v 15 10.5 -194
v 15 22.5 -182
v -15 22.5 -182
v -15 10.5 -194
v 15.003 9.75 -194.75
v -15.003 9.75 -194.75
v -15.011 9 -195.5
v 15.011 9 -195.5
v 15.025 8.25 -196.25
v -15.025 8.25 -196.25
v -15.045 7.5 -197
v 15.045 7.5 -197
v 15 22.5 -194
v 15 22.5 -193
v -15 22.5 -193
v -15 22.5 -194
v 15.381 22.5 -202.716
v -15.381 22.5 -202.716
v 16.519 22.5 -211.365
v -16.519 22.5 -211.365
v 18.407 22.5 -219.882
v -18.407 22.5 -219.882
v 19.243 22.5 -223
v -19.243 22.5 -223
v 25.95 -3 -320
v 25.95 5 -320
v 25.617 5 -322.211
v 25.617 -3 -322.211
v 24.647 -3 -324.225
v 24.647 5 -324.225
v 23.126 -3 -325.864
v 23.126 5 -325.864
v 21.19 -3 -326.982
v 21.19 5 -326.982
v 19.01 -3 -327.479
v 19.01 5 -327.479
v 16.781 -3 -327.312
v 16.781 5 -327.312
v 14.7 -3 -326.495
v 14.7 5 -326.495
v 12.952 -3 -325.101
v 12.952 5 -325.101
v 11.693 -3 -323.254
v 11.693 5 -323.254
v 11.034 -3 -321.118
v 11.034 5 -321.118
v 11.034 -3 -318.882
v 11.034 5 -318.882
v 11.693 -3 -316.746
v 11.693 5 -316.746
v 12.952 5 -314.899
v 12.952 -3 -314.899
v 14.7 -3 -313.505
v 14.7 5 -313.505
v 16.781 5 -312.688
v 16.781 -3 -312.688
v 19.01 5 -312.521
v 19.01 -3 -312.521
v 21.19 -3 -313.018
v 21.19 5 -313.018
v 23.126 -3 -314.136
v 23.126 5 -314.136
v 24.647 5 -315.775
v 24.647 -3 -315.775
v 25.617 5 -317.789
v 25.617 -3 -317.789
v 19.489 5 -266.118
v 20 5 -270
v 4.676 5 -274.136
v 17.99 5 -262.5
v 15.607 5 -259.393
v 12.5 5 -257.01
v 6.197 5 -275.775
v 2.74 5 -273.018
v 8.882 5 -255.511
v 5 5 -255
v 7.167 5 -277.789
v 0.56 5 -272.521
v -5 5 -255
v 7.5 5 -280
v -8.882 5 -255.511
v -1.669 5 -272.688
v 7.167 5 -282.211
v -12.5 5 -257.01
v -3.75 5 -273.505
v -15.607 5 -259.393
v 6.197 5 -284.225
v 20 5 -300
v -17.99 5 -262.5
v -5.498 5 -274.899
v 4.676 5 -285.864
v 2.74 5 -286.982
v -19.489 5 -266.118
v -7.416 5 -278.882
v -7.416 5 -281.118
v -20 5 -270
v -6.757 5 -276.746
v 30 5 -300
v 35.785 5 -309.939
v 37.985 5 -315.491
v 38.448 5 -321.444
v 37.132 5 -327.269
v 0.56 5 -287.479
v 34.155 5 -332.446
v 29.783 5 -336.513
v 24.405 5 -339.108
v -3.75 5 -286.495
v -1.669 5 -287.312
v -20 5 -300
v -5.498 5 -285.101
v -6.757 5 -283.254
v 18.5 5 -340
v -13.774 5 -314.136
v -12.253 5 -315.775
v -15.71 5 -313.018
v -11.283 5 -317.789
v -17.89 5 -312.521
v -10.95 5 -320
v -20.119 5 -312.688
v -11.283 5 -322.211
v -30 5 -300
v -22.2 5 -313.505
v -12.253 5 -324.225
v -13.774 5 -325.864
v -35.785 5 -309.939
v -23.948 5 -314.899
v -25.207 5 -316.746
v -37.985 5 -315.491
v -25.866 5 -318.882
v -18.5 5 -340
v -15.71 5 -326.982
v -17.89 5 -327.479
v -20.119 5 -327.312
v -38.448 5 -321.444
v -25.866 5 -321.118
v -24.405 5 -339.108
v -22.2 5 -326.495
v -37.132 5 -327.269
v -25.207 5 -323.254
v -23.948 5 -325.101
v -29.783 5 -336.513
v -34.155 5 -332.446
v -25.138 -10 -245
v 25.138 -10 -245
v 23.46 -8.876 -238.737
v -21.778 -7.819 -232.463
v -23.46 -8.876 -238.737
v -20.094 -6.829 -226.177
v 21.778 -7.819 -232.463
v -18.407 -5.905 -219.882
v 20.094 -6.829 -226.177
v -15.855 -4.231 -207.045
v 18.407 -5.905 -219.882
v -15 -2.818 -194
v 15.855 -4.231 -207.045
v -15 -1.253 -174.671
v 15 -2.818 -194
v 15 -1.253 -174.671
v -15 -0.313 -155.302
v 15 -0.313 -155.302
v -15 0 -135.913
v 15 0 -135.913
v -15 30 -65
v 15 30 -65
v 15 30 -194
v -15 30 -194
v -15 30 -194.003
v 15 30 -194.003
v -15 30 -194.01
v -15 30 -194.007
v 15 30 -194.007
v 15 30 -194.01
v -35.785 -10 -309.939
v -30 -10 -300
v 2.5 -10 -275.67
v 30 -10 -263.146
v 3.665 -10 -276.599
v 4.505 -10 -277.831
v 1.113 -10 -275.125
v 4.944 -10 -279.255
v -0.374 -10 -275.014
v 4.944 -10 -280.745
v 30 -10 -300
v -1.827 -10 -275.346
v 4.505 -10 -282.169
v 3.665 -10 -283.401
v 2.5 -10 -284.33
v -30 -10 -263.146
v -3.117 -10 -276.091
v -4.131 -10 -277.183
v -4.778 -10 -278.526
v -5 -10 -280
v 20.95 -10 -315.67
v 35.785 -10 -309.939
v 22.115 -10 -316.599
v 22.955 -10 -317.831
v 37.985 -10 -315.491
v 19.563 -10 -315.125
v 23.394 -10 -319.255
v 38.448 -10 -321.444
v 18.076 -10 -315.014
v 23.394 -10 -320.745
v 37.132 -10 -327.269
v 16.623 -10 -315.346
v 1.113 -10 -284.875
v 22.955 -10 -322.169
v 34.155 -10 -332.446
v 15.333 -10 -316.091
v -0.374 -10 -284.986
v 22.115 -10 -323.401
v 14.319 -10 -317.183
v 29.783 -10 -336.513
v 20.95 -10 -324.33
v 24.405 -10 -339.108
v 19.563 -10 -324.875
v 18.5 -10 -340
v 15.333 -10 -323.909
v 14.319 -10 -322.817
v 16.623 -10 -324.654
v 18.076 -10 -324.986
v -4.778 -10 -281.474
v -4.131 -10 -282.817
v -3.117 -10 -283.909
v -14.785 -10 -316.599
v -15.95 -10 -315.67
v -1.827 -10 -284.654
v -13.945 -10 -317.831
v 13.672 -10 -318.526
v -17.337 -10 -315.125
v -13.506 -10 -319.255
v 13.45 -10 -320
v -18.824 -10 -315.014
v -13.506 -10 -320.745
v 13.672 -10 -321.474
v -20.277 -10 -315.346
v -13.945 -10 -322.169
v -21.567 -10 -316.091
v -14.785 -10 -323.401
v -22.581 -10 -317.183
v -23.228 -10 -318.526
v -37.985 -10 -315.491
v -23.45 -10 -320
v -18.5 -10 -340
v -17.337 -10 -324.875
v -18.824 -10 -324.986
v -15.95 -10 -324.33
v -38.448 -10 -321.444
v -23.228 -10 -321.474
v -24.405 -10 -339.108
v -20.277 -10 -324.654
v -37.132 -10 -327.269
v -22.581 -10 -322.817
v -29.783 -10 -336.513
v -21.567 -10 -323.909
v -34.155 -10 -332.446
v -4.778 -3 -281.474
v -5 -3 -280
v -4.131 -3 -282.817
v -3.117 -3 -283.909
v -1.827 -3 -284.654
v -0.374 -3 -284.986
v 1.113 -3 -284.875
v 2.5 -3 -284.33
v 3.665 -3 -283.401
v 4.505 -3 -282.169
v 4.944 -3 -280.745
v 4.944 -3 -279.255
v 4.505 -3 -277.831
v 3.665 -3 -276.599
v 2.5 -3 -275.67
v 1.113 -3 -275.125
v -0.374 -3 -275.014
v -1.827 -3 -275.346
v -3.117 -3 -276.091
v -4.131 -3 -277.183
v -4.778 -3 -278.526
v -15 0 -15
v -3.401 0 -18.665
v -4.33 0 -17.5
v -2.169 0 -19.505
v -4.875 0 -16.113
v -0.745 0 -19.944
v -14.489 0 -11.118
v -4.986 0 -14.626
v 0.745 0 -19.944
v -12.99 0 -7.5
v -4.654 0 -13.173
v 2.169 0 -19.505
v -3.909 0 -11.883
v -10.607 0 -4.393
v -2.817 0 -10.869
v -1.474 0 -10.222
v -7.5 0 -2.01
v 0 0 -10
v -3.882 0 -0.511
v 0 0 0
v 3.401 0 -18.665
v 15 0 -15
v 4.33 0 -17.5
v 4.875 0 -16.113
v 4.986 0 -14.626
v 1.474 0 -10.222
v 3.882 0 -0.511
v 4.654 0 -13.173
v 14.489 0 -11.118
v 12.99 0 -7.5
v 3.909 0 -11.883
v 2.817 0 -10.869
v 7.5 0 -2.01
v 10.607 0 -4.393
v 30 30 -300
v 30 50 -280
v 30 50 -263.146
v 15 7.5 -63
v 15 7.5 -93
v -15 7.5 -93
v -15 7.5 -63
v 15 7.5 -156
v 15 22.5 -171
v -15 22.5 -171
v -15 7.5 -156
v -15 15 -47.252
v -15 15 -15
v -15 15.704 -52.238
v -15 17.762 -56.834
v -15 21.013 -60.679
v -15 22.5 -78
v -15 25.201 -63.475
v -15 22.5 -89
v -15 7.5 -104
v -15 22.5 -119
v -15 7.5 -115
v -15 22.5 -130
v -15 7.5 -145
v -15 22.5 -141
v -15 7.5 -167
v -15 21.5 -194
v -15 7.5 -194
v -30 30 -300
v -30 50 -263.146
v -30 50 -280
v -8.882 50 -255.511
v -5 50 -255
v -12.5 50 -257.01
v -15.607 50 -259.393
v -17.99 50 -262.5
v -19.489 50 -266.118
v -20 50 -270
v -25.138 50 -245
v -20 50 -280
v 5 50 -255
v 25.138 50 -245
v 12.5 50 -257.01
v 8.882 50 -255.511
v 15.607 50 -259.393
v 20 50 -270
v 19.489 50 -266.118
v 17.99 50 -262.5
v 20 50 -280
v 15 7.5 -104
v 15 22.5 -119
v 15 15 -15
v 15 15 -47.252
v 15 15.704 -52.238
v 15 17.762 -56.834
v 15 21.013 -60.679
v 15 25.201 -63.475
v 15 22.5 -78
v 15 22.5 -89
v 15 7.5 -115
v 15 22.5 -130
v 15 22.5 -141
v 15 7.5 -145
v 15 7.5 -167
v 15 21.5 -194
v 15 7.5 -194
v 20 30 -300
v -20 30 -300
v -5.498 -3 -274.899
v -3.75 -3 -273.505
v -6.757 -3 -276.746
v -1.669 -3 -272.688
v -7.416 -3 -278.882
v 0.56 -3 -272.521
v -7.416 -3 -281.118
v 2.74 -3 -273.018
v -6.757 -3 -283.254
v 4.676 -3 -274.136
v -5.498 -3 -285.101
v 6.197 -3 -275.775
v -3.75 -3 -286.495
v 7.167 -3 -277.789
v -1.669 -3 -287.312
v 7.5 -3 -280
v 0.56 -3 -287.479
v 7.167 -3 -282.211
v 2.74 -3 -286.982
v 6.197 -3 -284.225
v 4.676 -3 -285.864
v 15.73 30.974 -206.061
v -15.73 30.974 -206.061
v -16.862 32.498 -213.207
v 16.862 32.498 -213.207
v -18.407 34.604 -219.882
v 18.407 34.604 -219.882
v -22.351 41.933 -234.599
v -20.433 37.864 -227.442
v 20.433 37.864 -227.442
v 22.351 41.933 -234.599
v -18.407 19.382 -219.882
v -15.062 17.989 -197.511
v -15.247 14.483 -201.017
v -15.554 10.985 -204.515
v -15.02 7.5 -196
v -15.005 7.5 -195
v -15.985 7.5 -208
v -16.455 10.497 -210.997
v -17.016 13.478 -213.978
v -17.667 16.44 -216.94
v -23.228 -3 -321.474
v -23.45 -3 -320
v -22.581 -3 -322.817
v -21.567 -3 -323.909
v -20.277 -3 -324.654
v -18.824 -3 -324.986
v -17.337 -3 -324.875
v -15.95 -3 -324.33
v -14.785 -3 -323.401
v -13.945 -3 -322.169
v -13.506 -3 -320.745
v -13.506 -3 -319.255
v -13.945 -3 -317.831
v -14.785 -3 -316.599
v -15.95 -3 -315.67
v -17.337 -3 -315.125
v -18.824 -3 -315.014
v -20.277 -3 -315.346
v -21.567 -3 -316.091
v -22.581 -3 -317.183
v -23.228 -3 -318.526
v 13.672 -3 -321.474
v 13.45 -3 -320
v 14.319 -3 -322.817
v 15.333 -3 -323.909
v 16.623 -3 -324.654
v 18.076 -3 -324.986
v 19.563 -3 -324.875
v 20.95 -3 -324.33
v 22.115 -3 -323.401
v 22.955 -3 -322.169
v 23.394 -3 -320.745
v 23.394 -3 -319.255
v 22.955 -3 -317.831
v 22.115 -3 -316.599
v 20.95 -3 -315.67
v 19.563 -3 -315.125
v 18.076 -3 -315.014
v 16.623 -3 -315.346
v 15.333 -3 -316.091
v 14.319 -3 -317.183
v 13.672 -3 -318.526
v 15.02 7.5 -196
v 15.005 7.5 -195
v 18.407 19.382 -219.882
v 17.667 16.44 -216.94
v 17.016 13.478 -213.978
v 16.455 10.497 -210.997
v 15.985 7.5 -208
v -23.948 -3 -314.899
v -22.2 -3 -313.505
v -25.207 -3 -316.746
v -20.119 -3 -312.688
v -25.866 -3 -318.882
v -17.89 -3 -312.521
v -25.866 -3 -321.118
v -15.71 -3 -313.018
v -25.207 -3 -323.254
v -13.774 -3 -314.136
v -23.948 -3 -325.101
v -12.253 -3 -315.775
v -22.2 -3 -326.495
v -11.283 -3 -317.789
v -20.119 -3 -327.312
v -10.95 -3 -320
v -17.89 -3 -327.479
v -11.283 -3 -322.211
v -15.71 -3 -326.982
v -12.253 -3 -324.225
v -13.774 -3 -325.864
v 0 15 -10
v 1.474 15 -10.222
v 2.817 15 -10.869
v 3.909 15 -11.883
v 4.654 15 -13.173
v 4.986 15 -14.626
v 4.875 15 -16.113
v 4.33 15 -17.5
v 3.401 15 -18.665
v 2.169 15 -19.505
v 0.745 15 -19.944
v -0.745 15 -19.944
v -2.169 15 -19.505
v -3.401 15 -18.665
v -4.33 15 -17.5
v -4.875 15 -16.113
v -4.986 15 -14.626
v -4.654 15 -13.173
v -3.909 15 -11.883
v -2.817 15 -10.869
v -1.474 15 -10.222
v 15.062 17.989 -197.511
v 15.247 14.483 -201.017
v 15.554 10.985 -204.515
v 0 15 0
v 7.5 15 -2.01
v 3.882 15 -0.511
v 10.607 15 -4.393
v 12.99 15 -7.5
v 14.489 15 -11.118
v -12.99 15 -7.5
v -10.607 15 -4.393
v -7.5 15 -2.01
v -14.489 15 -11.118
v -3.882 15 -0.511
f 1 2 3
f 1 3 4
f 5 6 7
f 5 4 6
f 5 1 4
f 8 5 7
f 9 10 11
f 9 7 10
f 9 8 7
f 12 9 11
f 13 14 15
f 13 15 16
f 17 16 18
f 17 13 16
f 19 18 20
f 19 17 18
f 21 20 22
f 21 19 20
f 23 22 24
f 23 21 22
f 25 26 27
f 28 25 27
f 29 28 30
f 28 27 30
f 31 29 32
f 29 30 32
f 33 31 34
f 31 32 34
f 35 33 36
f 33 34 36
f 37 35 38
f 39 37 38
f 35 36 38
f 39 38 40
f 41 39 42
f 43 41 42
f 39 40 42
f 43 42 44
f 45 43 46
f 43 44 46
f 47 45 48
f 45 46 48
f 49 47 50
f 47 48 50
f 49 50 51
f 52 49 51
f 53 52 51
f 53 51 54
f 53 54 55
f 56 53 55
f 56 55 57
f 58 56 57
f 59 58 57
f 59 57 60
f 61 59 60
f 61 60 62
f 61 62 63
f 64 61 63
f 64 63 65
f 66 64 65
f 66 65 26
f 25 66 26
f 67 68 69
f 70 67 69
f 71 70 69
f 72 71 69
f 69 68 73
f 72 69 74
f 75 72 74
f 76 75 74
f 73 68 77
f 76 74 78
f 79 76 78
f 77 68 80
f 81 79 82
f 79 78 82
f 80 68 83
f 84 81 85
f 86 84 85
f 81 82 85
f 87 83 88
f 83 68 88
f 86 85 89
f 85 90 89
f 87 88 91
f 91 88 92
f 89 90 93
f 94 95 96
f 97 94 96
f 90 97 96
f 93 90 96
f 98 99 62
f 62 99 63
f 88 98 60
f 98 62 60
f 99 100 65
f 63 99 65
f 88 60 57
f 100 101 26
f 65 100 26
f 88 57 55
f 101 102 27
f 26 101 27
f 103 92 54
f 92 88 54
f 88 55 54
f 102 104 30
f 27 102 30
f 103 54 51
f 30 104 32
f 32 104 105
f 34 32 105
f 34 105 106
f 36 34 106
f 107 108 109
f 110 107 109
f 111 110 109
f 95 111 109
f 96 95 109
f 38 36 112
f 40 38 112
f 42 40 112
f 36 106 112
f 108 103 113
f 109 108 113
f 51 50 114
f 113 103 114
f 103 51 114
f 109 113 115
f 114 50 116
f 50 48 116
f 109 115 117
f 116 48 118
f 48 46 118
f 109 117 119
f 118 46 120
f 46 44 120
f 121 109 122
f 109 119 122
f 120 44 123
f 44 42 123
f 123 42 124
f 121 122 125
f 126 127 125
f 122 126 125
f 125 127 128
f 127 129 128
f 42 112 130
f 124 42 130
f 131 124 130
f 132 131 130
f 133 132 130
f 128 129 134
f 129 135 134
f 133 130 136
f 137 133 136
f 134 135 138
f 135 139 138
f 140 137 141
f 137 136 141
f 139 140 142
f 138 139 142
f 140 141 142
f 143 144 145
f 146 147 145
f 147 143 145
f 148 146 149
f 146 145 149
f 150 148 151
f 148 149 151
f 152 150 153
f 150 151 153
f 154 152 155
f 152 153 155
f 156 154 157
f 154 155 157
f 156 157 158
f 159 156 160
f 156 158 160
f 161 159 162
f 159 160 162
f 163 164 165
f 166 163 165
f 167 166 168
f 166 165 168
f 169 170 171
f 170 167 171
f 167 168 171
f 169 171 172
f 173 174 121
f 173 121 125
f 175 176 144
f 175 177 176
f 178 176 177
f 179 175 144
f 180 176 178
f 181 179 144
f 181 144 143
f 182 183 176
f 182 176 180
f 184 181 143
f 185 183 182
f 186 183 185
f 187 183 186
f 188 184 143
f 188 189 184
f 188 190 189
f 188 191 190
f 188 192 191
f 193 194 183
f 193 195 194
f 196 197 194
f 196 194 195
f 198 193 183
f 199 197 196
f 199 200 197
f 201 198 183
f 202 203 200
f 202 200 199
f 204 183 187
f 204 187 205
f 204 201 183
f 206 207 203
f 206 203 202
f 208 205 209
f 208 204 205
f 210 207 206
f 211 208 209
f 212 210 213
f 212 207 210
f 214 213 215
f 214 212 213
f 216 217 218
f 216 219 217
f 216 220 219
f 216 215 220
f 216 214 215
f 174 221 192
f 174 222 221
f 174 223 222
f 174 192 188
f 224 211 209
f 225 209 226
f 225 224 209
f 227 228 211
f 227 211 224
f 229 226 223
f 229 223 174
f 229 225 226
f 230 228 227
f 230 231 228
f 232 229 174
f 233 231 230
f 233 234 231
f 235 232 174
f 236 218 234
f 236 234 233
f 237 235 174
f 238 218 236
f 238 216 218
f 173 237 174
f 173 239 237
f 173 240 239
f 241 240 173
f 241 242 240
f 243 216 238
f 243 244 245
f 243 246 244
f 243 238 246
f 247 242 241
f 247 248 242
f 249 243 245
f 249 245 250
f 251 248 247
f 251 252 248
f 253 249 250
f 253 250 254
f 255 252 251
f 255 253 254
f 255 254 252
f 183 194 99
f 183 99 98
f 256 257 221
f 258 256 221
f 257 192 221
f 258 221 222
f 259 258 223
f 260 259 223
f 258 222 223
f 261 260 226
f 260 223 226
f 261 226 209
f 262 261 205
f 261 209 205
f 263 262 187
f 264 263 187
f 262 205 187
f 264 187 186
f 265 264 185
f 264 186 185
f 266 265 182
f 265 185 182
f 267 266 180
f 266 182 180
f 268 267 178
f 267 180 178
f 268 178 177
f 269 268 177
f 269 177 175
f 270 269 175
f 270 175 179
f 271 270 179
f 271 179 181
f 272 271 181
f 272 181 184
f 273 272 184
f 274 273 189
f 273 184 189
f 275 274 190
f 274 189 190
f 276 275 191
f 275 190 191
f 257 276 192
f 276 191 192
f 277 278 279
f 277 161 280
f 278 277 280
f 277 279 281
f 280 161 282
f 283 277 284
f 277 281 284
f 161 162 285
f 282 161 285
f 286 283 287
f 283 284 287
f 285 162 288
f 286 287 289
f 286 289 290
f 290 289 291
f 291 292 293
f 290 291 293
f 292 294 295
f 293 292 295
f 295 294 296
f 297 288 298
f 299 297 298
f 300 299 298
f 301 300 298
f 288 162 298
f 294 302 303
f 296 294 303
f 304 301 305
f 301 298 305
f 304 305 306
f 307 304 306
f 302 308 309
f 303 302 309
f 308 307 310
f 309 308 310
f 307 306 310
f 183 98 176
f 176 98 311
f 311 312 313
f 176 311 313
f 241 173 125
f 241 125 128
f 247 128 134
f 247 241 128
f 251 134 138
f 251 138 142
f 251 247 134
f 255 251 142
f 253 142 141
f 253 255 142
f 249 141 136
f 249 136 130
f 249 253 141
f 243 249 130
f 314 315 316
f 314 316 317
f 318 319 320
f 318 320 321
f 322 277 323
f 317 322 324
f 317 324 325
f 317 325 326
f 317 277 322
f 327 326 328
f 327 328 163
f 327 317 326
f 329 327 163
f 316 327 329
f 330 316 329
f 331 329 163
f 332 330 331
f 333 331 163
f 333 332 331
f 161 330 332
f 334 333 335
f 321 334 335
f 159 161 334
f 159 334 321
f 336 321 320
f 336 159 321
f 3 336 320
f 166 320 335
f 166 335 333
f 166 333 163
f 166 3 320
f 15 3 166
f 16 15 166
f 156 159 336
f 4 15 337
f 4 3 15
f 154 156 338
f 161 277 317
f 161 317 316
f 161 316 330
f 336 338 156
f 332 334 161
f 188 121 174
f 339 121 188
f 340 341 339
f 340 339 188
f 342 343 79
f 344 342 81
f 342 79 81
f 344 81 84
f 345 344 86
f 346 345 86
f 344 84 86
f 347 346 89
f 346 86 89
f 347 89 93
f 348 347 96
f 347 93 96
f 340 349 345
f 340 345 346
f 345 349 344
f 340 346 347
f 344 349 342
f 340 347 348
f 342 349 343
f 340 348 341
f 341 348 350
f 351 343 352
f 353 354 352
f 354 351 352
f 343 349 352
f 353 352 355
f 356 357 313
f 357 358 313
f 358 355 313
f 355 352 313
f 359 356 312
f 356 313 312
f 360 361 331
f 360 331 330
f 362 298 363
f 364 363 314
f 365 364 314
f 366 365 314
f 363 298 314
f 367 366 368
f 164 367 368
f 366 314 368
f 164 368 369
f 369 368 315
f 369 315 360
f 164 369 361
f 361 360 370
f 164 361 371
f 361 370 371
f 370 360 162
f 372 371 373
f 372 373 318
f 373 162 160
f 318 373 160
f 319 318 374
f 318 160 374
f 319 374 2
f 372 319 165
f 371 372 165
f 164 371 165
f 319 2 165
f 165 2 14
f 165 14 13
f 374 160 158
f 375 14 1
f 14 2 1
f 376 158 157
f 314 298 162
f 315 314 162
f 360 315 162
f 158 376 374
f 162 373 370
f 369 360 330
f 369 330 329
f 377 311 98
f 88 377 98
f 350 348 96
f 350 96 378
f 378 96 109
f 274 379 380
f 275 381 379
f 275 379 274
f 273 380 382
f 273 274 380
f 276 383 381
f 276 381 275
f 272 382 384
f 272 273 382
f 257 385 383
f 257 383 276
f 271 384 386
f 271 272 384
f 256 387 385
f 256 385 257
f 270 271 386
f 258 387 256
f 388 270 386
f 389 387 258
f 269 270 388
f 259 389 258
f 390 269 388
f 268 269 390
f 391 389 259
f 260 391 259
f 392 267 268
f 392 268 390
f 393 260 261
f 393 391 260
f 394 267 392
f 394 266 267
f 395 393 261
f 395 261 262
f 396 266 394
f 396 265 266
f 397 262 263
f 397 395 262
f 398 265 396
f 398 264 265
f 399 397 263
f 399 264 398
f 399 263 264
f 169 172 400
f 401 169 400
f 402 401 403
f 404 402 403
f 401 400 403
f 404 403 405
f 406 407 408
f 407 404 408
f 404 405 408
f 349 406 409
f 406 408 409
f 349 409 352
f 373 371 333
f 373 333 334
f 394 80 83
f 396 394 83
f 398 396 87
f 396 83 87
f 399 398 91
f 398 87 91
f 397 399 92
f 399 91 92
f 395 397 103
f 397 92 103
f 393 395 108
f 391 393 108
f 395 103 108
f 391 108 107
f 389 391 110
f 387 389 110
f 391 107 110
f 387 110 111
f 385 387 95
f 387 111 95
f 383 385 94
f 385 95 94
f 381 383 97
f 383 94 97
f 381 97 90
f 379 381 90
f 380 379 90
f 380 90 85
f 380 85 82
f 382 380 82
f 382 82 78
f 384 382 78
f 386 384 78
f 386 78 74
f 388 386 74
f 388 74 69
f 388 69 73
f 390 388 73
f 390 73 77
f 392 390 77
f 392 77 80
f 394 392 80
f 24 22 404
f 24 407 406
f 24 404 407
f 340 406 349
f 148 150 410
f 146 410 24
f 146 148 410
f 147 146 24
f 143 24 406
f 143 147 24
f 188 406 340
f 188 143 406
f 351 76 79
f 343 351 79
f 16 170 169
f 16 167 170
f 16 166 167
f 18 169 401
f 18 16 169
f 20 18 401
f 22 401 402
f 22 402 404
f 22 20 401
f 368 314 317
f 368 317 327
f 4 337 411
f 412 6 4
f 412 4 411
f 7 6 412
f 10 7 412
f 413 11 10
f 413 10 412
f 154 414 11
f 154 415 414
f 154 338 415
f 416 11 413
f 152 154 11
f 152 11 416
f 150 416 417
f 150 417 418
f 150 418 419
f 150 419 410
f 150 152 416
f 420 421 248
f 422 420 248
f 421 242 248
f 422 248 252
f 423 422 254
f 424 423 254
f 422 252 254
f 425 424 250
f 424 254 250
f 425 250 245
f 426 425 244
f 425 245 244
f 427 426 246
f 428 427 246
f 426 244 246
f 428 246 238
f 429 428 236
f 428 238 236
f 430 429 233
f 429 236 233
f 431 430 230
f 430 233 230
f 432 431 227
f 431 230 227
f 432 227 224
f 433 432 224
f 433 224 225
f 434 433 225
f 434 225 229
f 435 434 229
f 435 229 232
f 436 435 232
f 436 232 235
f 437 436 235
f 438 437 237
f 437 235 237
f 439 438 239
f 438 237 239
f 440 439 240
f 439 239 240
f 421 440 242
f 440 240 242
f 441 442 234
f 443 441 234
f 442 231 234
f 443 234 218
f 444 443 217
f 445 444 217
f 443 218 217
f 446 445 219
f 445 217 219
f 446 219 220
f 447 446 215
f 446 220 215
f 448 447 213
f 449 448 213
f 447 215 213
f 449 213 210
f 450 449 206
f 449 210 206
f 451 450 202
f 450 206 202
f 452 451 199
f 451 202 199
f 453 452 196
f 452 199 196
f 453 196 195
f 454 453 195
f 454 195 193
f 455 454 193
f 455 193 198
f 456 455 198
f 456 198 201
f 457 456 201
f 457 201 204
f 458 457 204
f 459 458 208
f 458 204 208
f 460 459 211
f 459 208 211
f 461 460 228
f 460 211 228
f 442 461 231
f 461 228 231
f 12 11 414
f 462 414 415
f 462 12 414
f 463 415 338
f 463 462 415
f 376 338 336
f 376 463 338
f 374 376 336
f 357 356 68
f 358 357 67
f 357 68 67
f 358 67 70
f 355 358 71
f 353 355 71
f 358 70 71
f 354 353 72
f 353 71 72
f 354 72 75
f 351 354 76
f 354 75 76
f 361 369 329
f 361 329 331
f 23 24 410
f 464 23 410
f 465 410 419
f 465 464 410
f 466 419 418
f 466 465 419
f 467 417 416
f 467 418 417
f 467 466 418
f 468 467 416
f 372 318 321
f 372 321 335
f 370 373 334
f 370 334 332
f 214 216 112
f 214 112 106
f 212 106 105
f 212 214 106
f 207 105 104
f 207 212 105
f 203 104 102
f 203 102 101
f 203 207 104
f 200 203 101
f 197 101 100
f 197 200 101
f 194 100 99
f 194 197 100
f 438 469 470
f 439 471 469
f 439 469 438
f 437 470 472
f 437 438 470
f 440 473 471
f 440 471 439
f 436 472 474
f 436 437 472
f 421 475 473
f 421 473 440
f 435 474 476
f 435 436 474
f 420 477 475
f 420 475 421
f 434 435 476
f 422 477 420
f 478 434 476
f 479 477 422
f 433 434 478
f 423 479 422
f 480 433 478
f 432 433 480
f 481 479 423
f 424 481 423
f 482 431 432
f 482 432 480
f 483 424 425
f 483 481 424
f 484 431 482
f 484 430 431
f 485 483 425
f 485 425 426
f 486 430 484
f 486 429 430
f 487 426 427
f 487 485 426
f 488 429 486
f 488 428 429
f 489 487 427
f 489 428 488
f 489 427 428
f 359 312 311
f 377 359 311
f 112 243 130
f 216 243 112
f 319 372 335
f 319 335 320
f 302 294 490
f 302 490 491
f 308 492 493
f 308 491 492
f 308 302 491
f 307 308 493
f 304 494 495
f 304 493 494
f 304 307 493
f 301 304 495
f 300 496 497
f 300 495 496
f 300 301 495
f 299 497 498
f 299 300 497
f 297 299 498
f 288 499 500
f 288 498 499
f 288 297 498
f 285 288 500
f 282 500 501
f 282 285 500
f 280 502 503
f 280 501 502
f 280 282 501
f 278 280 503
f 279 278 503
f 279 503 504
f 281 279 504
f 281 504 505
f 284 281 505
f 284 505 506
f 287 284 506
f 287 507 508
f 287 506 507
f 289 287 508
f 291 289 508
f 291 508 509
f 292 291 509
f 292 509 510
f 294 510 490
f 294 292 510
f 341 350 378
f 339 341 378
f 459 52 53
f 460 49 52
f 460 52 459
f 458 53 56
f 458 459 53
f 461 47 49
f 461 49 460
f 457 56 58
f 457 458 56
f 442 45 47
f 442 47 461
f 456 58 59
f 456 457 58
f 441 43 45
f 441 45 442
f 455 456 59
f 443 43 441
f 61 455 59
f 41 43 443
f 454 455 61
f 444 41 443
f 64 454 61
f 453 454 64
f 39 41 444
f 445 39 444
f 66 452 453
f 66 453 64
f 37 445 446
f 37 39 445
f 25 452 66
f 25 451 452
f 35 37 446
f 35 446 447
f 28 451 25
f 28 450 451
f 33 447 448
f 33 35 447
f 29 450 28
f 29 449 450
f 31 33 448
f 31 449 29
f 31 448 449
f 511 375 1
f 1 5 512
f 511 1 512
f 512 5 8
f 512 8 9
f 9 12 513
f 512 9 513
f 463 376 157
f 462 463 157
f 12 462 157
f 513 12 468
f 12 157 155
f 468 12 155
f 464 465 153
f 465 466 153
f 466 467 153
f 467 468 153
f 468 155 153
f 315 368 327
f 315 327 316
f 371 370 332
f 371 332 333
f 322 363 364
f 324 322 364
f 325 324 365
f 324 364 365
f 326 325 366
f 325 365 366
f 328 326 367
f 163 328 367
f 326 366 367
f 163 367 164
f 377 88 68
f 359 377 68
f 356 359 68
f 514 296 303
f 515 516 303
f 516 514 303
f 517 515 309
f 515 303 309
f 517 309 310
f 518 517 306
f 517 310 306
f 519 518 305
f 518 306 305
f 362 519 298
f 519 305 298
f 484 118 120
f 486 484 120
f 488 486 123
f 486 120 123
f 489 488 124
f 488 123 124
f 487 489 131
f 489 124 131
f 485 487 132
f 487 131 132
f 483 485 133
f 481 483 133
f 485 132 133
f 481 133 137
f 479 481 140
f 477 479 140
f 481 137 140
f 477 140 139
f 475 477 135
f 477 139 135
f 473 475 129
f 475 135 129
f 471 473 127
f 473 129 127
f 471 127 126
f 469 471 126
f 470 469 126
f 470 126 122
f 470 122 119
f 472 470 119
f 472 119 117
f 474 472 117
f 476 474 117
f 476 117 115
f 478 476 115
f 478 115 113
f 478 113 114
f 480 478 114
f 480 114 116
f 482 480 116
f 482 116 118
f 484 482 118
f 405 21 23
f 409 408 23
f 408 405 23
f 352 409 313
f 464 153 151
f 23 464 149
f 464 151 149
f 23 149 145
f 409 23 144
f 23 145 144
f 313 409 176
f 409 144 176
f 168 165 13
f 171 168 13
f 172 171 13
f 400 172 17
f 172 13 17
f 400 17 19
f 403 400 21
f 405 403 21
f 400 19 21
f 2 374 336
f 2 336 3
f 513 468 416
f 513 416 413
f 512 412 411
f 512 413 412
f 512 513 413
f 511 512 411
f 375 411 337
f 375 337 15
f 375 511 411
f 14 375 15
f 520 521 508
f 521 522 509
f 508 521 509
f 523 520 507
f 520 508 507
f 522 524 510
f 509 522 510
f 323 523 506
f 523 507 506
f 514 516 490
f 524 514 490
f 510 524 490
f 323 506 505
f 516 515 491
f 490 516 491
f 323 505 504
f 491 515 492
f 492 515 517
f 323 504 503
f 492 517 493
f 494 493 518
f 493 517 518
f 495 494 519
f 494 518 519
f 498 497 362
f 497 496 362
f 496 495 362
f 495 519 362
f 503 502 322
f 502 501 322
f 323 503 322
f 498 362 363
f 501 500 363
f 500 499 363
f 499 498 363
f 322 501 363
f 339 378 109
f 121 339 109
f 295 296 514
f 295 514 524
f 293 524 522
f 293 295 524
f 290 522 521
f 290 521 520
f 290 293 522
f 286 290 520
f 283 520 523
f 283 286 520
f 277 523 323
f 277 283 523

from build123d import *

# Parameters (mm, degrees)
BOSS_EXTRUDE1_DEPTH                      = 30
CUT_EXTRUDE1_DEPTH                       = 306.614135799
CUT_EXTRUDE1_DEPTH_BACK                  = 306.614135799
SKETCH2_R                                = 5
BOSS_EXTRUDE2_START                      = -10
BOSS_EXTRUDE2_DEPTH                      = 15
CBORE_FOR_M10_HEX_HEAD_BOLT1_D           = 10
CBORE_FOR_M10_HEX_HEAD_BOLT1_CBORE_D     = 15
CBORE_FOR_M10_HEX_HEAD_BOLT1_CBORE_DEPTH = 8


with BuildPart() as part:
    # Sketch1 → Boss-Extrude1 (new, symmetric)
    with BuildSketch(Plane(origin=(0, 0, 0), x_dir=(0, 0, -1), z_dir=(1, 0, 0))):
        with BuildLine():
            Line((0, 0), (0, 15))
            Line((0, 15), (47.251760651, 15))
            ThreePointArc((47.251760651, 15), (58.870710689, 19.252272915), (65, 30))
            Line((65, 30), (194.009804864, 30))
            ThreePointArc((194.009804864, 30), (221.395932739, 35.178799781), (245, 50))
            Line((245, 50), (280, 50))
            Line((280, 50), (300, 30))
            Line((300, 30), (300, -10))
            Line((300, -10), (245, -10))
            ThreePointArc((245, -10), (190.685134604, -2.505230148), (135.912878854, 0))
            Line((135.912878854, 0), (0, 0))
        make_face()
        Polygon((63, 7.5), (78, 22.5), (93, 7.5), align=None, mode=Mode.SUBTRACT)
        Polygon((104, 7.5), (89, 22.5), (119, 22.5), align=None, mode=Mode.SUBTRACT)
        Polygon((171, 22.5), (156, 7.5), (141, 22.5), align=None, mode=Mode.SUBTRACT)
        Polygon((145, 7.5), (115, 7.5), (130, 22.5), align=None, mode=Mode.SUBTRACT)
        Polygon((223, 22.5), (208, 7.5), (193, 22.5), align=None, mode=Mode.SUBTRACT)
        Polygon((197, 7.5), (167, 7.5), (182, 22.5), align=None, mode=Mode.SUBTRACT)
    extrude(amount=BOSS_EXTRUDE1_DEPTH, both=True)

    # Sketch2 → Cut-Extrude1 (cut, two sides: drawn at the far end of the back side and taken through both)
    with BuildSketch(Plane(origin=(0, 0, 0), x_dir=(1, 0, 0), z_dir=(0, 1, 0)).offset(-CUT_EXTRUDE1_DEPTH_BACK)):
        with BuildLine():
            ThreePointArc((15, 194), (15.855513863, 207.052619222), (18.407417371, 219.88190451))
            Line((18.407417371, 219.88190451), (30, 263.146011872))
            Line((30, 263.146011872), (30, 300))
            Line((30, 300), (100, 300))
            Line((100, 300), (100, 0))
            Line((100, 0), (0, 0))
            ThreePointArc((0, 0), (10.606601718, 4.393398282), (15, 15))
            Line((15, 15), (15, 194))
        make_face()
        with BuildLine():
            Line((-15, 15), (-15, 194))
            ThreePointArc((-15, 194), (-15.855513863, 207.052619222), (-18.407417371, 219.88190451))
            Line((-18.407417371, 219.88190451), (-30, 263.146011872))
            Line((-30, 263.146011872), (-30, 300))
            Line((-30, 300), (-100, 300))
            Line((-100, 300), (-100, 0))
            Line((-100, 0), (0, 0))
            ThreePointArc((0, 0), (-10.606601718, 4.393398282), (-15, 15))
        make_face()
        with BuildLine():
            Line((-20, 300), (20, 300))
            Line((20, 300), (20, 270))
            ThreePointArc((20, 270), (15.606601718, 259.393398282), (5, 255))
            Line((5, 255), (0, 255))
            Line((0, 255), (-5, 255))
            ThreePointArc((-5, 255), (-15.606601718, 259.393398282), (-20, 270))
            Line((-20, 270), (-20, 300))
        make_face()
        with Locations(Location((0, 15, 0), (0, 0, 270))):
            Circle(SKETCH2_R)
    extrude(amount=CUT_EXTRUDE1_DEPTH + CUT_EXTRUDE1_DEPTH_BACK, mode=Mode.SUBTRACT)

    # Sketch3 → Boss-Extrude2 (add)
    with BuildSketch(Plane(origin=(0, 0, 0), x_dir=(1, 0, 0), z_dir=(0, 1, 0)).offset(BOSS_EXTRUDE2_START)):
        with BuildLine():
            Line((-20, 270), (-20, 280))
            Line((-20, 280), (-20, 300))
            Line((-20, 300), (-30, 300))
            Line((-30, 300), (-35.78511038, 309.938938469))
            ThreePointArc((-35.78511038, 309.938938469), (-35.838126061, 329.969422485), (-18.5, 340))
            Line((-18.5, 340), (0, 340))
            Line((0, 340), (18.5, 340))
            ThreePointArc((18.5, 340), (35.838126061, 329.969422485), (35.78511038, 309.938938469))
            Line((35.78511038, 309.938938469), (30, 300))
            Line((30, 300), (20, 300))
            Line((20, 300), (20, 280))
            Line((20, 280), (20, 270))
            ThreePointArc((20, 270), (15.606601718, 259.393398282), (5, 255))
            Line((5, 255), (-5, 255))
            ThreePointArc((-5, 255), (-15.606601718, 259.393398282), (-20, 270))
        make_face()
    extrude(amount=BOSS_EXTRUDE2_DEPTH)

    # CBORE for M10 Hex Head Bolt1 (through all)
    with Locations(Plane(origin=(0, 5, 0), x_dir=(1, 0, 0), z_dir=(0, 1, 0))):
        with Locations((0, 280), (-18.45, 320), (18.45, 320)):
            CounterBoreHole(CBORE_FOR_M10_HEX_HEAD_BOLT1_D / 2, CBORE_FOR_M10_HEX_HEAD_BOLT1_CBORE_D / 2, CBORE_FOR_M10_HEX_HEAD_BOLT1_CBORE_DEPTH)


solid = part.part
